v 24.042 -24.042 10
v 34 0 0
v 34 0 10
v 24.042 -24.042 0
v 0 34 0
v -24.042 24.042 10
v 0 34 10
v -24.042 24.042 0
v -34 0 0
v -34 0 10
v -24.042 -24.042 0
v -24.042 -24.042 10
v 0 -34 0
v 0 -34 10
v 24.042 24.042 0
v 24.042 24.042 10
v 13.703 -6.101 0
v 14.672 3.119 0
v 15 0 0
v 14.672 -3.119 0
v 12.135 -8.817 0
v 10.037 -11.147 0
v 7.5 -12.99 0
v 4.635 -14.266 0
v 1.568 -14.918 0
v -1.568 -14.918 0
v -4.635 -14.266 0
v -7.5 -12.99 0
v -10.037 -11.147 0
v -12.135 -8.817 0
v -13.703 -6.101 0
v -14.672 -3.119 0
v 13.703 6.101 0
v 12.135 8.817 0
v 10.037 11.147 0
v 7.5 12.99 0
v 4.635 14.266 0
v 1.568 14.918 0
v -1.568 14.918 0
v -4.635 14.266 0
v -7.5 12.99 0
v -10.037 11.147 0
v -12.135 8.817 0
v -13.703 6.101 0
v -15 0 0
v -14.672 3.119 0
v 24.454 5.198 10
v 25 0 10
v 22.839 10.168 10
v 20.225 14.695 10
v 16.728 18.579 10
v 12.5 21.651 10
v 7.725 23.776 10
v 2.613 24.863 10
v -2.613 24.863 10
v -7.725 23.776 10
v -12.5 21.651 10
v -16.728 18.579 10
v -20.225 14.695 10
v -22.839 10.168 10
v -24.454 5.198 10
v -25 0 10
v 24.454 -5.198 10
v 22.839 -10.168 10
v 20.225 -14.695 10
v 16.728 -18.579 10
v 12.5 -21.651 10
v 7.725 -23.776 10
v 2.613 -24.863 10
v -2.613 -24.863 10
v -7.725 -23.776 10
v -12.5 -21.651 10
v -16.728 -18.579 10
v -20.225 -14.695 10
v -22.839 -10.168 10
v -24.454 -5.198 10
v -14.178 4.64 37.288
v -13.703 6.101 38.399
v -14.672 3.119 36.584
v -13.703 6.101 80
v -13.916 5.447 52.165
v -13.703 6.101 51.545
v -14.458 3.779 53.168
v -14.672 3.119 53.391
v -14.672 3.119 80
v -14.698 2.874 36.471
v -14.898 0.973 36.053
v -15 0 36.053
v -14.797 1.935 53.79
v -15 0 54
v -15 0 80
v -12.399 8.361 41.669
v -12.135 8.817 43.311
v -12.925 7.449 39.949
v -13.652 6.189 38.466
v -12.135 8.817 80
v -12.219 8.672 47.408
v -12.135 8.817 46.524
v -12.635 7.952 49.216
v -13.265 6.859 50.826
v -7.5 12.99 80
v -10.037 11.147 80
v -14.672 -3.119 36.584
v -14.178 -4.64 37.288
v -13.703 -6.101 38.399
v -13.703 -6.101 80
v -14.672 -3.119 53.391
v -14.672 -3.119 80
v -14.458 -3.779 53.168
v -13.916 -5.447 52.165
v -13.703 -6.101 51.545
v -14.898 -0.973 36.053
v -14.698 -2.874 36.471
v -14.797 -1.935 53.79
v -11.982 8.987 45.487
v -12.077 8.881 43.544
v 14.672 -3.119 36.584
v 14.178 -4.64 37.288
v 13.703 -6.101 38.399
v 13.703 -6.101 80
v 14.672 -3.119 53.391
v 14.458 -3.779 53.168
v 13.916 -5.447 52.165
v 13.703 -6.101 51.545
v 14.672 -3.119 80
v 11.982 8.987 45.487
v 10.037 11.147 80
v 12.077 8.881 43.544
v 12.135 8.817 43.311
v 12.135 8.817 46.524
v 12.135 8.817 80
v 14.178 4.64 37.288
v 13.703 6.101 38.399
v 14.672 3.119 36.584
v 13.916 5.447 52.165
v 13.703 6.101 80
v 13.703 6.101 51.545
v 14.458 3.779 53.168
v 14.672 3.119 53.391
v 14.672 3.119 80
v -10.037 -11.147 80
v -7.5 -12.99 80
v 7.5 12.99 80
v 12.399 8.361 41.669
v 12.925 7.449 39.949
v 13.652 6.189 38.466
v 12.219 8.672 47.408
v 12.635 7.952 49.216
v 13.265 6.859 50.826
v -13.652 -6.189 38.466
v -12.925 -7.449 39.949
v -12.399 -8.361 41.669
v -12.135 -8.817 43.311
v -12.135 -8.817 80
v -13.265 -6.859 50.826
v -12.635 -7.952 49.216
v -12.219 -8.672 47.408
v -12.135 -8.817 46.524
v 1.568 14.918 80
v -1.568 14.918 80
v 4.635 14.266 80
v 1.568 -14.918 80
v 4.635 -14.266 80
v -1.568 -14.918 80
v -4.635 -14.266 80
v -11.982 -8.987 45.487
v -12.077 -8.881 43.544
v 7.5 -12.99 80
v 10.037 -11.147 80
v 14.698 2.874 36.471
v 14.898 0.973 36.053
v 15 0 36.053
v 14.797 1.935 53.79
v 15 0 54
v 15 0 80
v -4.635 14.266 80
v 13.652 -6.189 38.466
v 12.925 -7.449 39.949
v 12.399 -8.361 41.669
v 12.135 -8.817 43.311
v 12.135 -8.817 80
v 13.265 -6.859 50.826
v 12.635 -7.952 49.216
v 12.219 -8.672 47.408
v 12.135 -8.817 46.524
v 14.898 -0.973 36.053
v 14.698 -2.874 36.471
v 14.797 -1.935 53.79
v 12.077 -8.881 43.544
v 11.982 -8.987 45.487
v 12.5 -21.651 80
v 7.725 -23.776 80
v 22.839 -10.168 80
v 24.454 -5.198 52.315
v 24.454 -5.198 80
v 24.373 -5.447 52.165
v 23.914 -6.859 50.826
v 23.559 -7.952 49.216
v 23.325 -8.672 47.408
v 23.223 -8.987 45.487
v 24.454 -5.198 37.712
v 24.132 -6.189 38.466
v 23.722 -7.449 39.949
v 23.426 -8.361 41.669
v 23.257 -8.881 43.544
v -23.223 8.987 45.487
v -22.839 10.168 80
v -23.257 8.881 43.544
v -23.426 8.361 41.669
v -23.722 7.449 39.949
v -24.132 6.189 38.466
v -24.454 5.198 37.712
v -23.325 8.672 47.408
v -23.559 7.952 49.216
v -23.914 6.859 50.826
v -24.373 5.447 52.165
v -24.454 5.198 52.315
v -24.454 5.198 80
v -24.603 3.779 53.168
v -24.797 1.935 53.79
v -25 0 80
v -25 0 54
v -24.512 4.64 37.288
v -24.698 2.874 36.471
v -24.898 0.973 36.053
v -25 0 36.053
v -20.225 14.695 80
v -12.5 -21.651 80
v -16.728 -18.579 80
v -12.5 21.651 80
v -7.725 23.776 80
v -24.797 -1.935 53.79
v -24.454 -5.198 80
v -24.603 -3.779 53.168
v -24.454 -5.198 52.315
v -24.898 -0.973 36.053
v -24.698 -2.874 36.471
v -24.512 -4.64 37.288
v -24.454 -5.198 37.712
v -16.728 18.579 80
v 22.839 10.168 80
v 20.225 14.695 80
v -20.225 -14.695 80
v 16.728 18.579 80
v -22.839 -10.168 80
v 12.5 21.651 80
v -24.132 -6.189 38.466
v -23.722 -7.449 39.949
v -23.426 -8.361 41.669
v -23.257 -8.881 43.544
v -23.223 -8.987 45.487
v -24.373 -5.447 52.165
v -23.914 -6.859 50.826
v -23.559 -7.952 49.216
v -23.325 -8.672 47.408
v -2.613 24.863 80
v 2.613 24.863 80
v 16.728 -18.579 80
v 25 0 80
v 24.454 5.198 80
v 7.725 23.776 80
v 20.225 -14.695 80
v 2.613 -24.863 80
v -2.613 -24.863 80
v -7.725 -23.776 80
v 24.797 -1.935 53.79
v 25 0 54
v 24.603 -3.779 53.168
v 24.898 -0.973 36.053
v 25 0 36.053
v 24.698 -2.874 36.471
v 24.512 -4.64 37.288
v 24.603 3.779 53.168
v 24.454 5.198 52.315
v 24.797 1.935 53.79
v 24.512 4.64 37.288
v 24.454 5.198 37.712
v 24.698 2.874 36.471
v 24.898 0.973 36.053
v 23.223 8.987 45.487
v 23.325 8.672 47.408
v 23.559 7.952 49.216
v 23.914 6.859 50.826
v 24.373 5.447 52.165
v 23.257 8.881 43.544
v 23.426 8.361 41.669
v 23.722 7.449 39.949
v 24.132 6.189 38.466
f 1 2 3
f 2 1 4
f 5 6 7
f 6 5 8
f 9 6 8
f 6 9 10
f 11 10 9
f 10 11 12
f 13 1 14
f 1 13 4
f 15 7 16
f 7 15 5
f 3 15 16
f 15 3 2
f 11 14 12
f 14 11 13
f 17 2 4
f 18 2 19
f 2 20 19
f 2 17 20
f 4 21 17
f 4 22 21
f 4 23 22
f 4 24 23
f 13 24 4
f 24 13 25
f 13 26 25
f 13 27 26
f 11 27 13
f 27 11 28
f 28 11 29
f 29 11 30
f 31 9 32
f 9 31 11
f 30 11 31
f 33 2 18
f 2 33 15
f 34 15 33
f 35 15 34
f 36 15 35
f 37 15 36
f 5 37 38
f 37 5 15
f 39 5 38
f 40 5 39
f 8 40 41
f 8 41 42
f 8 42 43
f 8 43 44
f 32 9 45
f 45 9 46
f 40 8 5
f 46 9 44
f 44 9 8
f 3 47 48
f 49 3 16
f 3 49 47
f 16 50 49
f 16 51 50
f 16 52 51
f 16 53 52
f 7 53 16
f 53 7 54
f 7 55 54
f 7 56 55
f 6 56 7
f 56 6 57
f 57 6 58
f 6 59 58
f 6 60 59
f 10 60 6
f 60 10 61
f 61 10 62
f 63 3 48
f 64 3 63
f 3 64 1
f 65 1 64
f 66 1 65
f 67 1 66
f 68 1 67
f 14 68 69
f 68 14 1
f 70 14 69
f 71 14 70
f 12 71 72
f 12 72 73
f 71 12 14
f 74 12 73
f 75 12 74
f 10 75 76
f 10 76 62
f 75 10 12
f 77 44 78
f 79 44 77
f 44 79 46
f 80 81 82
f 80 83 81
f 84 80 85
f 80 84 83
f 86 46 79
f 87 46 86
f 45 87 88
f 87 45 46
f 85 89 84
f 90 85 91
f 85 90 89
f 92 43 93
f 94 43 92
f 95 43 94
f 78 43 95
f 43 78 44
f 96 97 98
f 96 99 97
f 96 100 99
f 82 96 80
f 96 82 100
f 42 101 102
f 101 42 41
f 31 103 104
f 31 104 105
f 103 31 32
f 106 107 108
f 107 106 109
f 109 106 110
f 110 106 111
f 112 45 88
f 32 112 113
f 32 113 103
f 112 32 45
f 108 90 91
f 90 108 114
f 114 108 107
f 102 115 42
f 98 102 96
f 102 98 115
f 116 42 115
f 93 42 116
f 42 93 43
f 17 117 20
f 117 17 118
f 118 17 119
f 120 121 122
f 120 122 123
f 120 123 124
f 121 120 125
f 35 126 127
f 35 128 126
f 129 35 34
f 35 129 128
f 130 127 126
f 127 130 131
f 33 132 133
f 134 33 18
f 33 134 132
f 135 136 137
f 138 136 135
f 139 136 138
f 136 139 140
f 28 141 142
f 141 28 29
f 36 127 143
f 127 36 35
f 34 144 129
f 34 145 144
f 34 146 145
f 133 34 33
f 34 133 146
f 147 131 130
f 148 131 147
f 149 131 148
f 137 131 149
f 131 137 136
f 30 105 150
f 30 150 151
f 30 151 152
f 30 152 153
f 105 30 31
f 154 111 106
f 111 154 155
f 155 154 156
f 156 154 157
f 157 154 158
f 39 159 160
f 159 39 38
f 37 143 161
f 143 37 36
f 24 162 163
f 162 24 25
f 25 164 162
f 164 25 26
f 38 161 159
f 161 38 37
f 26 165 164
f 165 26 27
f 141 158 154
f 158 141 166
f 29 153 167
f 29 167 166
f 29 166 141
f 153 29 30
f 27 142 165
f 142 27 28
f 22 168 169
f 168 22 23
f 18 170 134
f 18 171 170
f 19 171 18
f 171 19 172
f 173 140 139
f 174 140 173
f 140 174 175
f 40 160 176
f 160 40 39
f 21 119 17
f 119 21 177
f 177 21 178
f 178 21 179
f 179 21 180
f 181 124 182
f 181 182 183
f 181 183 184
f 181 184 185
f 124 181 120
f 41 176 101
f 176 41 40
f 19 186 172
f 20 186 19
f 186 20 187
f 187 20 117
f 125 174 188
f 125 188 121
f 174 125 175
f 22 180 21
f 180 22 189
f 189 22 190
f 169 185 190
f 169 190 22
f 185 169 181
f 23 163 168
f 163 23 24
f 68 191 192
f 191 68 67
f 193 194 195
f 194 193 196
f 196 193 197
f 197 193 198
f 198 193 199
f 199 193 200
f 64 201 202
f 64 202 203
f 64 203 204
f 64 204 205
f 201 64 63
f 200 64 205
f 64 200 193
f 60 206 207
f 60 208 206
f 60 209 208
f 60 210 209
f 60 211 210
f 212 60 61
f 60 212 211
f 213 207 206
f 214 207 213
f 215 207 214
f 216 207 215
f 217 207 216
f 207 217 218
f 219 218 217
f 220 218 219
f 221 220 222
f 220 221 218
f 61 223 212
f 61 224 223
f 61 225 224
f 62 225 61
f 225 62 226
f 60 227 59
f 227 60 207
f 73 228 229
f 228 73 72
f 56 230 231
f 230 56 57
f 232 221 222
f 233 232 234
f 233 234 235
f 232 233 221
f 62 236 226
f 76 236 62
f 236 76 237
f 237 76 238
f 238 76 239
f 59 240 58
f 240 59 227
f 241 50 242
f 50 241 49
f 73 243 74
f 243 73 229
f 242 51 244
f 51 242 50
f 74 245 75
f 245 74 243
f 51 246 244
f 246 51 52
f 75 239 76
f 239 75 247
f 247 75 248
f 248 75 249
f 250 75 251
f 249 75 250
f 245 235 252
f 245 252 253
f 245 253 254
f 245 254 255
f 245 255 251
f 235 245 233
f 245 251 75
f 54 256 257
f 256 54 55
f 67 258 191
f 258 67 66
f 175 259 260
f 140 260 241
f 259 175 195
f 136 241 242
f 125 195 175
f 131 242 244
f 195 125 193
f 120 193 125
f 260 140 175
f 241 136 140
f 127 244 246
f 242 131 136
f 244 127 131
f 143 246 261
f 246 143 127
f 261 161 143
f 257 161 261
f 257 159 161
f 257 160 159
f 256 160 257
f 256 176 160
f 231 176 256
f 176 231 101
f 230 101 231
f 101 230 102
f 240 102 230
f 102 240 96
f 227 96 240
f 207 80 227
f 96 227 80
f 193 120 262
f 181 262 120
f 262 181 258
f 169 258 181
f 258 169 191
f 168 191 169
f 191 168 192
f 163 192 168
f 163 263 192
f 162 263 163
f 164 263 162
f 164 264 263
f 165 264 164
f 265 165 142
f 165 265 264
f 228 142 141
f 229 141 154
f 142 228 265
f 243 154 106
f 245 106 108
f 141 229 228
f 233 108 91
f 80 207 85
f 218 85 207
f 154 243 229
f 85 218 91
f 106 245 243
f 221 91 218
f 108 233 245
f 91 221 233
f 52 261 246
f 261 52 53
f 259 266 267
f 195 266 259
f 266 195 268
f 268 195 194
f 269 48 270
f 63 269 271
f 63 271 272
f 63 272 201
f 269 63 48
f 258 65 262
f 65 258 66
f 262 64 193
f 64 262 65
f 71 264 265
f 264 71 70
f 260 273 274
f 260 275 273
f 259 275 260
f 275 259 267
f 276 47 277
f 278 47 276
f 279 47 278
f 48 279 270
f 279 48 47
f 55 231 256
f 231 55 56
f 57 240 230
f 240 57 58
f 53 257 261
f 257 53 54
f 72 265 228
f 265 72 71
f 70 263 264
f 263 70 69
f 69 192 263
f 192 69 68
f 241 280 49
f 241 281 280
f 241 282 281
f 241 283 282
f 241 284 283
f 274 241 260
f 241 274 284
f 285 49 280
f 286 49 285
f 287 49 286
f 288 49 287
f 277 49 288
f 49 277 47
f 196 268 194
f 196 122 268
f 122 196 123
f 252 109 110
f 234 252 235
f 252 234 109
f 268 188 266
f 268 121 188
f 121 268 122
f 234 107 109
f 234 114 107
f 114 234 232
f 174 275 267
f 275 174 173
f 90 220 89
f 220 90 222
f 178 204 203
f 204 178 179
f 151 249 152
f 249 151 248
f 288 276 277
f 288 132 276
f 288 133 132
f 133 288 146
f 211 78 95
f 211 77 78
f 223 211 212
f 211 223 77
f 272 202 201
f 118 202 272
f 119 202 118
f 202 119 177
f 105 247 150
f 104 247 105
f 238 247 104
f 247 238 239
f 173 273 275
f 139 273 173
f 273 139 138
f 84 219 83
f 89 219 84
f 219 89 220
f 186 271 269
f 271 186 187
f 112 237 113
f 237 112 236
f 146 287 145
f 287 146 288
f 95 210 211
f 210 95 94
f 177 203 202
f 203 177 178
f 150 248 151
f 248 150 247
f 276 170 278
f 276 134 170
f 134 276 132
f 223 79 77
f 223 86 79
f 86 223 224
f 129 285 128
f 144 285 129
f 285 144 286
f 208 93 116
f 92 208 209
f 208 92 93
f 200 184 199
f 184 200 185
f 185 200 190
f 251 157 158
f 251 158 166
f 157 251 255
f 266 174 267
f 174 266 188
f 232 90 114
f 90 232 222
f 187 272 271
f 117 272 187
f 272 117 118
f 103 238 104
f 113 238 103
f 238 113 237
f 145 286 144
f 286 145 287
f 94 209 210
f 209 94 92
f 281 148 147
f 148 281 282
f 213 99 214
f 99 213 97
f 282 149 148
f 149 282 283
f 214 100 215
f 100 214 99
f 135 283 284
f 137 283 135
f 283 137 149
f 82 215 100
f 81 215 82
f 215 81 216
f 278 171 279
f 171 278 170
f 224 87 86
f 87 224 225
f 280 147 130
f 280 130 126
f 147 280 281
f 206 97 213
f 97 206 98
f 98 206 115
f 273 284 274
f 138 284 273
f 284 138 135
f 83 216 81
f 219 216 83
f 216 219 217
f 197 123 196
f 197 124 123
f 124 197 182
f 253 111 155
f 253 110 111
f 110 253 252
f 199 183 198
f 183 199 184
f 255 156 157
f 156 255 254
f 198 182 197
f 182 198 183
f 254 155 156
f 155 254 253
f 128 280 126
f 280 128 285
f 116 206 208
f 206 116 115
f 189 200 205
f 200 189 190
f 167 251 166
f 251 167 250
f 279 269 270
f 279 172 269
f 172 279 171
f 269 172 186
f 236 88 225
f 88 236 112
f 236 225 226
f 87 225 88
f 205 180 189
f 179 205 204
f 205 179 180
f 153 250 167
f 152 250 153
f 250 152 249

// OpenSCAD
//
//Filename = Graphic_finalassignment
//Exercise number == 163
//Date of implementation (15/ 15 / 2022)
//Name:  Bashir Alam
//email: bashir.alam_2023@ucentralasia.org
//cohort: computer science




// this module creates the inner parts ( cylinders)
module Cyl(){
    // creating octagonal structure
translate([0,0, 70]){
    difference(){
    cylinder(h=10, d=68,$fn=8);
    translate([0, 0, -1]){
        cylinder(h=12, d= 30);
    }
}
} 
difference(){
    difference(){
        cylinder(80, d=50);
        translate([0, 0, -0.5]){
            cylinder(81, d= 30);
        }
    }

    // taking the inner(side) cyliner out
    rotate([0, 90, 0]){
        translate([-35, 0, -30]){
            cylinder(60, d = 18);
        }
    }
}
}



//calling the modules and fixing the positions using translate
rotate([0 , 180, 0]){
    translate([0, 0, -80]){
        Cyl();
    }
}
